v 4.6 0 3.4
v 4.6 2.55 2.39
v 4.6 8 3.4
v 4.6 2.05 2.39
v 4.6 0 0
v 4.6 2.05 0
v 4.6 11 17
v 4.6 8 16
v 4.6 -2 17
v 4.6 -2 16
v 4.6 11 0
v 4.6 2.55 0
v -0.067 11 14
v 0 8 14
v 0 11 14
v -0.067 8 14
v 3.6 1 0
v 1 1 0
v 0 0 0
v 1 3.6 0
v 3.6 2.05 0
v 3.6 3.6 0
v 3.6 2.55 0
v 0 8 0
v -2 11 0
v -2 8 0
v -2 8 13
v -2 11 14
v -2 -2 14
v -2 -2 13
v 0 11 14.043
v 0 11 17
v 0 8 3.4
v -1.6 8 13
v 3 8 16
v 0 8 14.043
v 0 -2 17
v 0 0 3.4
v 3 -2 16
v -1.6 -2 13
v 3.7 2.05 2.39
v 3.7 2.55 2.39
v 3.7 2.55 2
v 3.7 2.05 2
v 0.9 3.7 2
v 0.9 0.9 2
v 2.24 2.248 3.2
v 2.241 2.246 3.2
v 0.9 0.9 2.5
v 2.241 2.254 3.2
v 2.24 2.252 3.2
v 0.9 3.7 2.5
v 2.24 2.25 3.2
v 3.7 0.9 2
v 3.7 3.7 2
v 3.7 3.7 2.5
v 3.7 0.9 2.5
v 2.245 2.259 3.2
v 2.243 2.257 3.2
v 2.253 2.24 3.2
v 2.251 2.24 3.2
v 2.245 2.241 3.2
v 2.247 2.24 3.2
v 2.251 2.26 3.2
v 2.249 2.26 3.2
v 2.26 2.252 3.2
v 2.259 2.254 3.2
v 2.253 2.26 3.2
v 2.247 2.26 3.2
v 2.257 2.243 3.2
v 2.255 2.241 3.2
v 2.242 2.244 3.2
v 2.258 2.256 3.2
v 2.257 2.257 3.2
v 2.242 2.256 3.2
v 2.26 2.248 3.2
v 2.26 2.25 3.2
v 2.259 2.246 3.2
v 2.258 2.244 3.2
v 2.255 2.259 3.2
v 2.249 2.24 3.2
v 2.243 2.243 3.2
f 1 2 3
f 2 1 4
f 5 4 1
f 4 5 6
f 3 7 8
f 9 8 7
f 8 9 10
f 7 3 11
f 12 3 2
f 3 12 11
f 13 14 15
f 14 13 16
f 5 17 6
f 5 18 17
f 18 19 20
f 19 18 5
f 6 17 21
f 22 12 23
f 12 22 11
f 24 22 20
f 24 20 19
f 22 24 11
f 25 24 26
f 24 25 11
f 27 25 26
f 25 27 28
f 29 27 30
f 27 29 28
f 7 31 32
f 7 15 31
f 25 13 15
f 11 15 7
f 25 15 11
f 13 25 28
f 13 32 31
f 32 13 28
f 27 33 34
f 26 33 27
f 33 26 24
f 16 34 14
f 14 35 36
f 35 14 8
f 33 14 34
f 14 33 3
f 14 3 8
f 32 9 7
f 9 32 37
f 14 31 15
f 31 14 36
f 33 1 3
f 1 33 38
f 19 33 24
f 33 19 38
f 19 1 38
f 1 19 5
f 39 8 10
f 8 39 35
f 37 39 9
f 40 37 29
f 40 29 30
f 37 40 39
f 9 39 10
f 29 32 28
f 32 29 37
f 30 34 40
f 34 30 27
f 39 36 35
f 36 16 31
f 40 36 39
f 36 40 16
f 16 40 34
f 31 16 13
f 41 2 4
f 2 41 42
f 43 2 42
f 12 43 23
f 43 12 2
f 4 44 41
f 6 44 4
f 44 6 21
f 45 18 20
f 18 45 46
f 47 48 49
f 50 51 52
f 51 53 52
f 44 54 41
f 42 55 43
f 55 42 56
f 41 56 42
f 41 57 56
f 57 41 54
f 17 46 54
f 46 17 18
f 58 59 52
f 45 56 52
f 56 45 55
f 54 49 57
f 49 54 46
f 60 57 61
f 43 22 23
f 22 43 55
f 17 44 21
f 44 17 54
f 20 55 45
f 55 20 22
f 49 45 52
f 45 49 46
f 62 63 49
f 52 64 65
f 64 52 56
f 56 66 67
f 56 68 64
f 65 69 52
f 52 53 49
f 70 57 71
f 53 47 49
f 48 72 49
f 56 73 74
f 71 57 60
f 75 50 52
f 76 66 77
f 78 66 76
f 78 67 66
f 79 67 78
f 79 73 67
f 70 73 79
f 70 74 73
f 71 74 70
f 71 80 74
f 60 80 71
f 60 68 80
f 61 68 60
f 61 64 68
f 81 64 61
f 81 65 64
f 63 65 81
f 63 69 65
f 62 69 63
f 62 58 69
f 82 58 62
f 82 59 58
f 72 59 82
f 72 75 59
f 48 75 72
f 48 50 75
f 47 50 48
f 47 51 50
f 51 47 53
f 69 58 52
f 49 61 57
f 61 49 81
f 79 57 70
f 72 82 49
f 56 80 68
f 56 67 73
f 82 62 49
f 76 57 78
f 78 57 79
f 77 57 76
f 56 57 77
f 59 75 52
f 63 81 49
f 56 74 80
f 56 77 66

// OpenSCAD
cutout_size = 2.6;
offset_length = 8;
main_height = 17;

difference() {
  union() {
    cube([cutout_size+2,3+offset_length,3.4]);
    translate([-2,offset_length,0]) {
      cube([cutout_size+4,3,main_height-3]);
      translate([2,0,0]) cube([cutout_size+2,3,main_height]);
    }
    translate([0,-2,main_height-1])
      cube([cutout_size+2,2+offset_length,1]);
    translate([-2,-2,main_height-1]) hull() {
      translate([2,0,0]) cube([3,5+offset_length,1]);
      translate([0,0,-3]) cube([0.4,5+offset_length,1]);
    }
    //translate([0,-3,11])
      //#cube([cutout_size+2,15,1]);
  }
  
  // cutout slot
  translate([-0.05+2,1+cutout_size/2-0.25,-0.01])
      cube([cutout_size+2.1,0.5,2.4]);
  // cutout
  translate([1,1,0]) #hull() {
    translate([0,0,-0.01]) #cube([cutout_size, cutout_size, 2]);
    translate([-0.1,-0.1,2]) #cube([cutout_size+0.2, cutout_size+0.2, 0.5]);
    
    translate([1.25,1.25,0]) cylinder(h=3.2,r=0.01, $fn=30);
  }
}
